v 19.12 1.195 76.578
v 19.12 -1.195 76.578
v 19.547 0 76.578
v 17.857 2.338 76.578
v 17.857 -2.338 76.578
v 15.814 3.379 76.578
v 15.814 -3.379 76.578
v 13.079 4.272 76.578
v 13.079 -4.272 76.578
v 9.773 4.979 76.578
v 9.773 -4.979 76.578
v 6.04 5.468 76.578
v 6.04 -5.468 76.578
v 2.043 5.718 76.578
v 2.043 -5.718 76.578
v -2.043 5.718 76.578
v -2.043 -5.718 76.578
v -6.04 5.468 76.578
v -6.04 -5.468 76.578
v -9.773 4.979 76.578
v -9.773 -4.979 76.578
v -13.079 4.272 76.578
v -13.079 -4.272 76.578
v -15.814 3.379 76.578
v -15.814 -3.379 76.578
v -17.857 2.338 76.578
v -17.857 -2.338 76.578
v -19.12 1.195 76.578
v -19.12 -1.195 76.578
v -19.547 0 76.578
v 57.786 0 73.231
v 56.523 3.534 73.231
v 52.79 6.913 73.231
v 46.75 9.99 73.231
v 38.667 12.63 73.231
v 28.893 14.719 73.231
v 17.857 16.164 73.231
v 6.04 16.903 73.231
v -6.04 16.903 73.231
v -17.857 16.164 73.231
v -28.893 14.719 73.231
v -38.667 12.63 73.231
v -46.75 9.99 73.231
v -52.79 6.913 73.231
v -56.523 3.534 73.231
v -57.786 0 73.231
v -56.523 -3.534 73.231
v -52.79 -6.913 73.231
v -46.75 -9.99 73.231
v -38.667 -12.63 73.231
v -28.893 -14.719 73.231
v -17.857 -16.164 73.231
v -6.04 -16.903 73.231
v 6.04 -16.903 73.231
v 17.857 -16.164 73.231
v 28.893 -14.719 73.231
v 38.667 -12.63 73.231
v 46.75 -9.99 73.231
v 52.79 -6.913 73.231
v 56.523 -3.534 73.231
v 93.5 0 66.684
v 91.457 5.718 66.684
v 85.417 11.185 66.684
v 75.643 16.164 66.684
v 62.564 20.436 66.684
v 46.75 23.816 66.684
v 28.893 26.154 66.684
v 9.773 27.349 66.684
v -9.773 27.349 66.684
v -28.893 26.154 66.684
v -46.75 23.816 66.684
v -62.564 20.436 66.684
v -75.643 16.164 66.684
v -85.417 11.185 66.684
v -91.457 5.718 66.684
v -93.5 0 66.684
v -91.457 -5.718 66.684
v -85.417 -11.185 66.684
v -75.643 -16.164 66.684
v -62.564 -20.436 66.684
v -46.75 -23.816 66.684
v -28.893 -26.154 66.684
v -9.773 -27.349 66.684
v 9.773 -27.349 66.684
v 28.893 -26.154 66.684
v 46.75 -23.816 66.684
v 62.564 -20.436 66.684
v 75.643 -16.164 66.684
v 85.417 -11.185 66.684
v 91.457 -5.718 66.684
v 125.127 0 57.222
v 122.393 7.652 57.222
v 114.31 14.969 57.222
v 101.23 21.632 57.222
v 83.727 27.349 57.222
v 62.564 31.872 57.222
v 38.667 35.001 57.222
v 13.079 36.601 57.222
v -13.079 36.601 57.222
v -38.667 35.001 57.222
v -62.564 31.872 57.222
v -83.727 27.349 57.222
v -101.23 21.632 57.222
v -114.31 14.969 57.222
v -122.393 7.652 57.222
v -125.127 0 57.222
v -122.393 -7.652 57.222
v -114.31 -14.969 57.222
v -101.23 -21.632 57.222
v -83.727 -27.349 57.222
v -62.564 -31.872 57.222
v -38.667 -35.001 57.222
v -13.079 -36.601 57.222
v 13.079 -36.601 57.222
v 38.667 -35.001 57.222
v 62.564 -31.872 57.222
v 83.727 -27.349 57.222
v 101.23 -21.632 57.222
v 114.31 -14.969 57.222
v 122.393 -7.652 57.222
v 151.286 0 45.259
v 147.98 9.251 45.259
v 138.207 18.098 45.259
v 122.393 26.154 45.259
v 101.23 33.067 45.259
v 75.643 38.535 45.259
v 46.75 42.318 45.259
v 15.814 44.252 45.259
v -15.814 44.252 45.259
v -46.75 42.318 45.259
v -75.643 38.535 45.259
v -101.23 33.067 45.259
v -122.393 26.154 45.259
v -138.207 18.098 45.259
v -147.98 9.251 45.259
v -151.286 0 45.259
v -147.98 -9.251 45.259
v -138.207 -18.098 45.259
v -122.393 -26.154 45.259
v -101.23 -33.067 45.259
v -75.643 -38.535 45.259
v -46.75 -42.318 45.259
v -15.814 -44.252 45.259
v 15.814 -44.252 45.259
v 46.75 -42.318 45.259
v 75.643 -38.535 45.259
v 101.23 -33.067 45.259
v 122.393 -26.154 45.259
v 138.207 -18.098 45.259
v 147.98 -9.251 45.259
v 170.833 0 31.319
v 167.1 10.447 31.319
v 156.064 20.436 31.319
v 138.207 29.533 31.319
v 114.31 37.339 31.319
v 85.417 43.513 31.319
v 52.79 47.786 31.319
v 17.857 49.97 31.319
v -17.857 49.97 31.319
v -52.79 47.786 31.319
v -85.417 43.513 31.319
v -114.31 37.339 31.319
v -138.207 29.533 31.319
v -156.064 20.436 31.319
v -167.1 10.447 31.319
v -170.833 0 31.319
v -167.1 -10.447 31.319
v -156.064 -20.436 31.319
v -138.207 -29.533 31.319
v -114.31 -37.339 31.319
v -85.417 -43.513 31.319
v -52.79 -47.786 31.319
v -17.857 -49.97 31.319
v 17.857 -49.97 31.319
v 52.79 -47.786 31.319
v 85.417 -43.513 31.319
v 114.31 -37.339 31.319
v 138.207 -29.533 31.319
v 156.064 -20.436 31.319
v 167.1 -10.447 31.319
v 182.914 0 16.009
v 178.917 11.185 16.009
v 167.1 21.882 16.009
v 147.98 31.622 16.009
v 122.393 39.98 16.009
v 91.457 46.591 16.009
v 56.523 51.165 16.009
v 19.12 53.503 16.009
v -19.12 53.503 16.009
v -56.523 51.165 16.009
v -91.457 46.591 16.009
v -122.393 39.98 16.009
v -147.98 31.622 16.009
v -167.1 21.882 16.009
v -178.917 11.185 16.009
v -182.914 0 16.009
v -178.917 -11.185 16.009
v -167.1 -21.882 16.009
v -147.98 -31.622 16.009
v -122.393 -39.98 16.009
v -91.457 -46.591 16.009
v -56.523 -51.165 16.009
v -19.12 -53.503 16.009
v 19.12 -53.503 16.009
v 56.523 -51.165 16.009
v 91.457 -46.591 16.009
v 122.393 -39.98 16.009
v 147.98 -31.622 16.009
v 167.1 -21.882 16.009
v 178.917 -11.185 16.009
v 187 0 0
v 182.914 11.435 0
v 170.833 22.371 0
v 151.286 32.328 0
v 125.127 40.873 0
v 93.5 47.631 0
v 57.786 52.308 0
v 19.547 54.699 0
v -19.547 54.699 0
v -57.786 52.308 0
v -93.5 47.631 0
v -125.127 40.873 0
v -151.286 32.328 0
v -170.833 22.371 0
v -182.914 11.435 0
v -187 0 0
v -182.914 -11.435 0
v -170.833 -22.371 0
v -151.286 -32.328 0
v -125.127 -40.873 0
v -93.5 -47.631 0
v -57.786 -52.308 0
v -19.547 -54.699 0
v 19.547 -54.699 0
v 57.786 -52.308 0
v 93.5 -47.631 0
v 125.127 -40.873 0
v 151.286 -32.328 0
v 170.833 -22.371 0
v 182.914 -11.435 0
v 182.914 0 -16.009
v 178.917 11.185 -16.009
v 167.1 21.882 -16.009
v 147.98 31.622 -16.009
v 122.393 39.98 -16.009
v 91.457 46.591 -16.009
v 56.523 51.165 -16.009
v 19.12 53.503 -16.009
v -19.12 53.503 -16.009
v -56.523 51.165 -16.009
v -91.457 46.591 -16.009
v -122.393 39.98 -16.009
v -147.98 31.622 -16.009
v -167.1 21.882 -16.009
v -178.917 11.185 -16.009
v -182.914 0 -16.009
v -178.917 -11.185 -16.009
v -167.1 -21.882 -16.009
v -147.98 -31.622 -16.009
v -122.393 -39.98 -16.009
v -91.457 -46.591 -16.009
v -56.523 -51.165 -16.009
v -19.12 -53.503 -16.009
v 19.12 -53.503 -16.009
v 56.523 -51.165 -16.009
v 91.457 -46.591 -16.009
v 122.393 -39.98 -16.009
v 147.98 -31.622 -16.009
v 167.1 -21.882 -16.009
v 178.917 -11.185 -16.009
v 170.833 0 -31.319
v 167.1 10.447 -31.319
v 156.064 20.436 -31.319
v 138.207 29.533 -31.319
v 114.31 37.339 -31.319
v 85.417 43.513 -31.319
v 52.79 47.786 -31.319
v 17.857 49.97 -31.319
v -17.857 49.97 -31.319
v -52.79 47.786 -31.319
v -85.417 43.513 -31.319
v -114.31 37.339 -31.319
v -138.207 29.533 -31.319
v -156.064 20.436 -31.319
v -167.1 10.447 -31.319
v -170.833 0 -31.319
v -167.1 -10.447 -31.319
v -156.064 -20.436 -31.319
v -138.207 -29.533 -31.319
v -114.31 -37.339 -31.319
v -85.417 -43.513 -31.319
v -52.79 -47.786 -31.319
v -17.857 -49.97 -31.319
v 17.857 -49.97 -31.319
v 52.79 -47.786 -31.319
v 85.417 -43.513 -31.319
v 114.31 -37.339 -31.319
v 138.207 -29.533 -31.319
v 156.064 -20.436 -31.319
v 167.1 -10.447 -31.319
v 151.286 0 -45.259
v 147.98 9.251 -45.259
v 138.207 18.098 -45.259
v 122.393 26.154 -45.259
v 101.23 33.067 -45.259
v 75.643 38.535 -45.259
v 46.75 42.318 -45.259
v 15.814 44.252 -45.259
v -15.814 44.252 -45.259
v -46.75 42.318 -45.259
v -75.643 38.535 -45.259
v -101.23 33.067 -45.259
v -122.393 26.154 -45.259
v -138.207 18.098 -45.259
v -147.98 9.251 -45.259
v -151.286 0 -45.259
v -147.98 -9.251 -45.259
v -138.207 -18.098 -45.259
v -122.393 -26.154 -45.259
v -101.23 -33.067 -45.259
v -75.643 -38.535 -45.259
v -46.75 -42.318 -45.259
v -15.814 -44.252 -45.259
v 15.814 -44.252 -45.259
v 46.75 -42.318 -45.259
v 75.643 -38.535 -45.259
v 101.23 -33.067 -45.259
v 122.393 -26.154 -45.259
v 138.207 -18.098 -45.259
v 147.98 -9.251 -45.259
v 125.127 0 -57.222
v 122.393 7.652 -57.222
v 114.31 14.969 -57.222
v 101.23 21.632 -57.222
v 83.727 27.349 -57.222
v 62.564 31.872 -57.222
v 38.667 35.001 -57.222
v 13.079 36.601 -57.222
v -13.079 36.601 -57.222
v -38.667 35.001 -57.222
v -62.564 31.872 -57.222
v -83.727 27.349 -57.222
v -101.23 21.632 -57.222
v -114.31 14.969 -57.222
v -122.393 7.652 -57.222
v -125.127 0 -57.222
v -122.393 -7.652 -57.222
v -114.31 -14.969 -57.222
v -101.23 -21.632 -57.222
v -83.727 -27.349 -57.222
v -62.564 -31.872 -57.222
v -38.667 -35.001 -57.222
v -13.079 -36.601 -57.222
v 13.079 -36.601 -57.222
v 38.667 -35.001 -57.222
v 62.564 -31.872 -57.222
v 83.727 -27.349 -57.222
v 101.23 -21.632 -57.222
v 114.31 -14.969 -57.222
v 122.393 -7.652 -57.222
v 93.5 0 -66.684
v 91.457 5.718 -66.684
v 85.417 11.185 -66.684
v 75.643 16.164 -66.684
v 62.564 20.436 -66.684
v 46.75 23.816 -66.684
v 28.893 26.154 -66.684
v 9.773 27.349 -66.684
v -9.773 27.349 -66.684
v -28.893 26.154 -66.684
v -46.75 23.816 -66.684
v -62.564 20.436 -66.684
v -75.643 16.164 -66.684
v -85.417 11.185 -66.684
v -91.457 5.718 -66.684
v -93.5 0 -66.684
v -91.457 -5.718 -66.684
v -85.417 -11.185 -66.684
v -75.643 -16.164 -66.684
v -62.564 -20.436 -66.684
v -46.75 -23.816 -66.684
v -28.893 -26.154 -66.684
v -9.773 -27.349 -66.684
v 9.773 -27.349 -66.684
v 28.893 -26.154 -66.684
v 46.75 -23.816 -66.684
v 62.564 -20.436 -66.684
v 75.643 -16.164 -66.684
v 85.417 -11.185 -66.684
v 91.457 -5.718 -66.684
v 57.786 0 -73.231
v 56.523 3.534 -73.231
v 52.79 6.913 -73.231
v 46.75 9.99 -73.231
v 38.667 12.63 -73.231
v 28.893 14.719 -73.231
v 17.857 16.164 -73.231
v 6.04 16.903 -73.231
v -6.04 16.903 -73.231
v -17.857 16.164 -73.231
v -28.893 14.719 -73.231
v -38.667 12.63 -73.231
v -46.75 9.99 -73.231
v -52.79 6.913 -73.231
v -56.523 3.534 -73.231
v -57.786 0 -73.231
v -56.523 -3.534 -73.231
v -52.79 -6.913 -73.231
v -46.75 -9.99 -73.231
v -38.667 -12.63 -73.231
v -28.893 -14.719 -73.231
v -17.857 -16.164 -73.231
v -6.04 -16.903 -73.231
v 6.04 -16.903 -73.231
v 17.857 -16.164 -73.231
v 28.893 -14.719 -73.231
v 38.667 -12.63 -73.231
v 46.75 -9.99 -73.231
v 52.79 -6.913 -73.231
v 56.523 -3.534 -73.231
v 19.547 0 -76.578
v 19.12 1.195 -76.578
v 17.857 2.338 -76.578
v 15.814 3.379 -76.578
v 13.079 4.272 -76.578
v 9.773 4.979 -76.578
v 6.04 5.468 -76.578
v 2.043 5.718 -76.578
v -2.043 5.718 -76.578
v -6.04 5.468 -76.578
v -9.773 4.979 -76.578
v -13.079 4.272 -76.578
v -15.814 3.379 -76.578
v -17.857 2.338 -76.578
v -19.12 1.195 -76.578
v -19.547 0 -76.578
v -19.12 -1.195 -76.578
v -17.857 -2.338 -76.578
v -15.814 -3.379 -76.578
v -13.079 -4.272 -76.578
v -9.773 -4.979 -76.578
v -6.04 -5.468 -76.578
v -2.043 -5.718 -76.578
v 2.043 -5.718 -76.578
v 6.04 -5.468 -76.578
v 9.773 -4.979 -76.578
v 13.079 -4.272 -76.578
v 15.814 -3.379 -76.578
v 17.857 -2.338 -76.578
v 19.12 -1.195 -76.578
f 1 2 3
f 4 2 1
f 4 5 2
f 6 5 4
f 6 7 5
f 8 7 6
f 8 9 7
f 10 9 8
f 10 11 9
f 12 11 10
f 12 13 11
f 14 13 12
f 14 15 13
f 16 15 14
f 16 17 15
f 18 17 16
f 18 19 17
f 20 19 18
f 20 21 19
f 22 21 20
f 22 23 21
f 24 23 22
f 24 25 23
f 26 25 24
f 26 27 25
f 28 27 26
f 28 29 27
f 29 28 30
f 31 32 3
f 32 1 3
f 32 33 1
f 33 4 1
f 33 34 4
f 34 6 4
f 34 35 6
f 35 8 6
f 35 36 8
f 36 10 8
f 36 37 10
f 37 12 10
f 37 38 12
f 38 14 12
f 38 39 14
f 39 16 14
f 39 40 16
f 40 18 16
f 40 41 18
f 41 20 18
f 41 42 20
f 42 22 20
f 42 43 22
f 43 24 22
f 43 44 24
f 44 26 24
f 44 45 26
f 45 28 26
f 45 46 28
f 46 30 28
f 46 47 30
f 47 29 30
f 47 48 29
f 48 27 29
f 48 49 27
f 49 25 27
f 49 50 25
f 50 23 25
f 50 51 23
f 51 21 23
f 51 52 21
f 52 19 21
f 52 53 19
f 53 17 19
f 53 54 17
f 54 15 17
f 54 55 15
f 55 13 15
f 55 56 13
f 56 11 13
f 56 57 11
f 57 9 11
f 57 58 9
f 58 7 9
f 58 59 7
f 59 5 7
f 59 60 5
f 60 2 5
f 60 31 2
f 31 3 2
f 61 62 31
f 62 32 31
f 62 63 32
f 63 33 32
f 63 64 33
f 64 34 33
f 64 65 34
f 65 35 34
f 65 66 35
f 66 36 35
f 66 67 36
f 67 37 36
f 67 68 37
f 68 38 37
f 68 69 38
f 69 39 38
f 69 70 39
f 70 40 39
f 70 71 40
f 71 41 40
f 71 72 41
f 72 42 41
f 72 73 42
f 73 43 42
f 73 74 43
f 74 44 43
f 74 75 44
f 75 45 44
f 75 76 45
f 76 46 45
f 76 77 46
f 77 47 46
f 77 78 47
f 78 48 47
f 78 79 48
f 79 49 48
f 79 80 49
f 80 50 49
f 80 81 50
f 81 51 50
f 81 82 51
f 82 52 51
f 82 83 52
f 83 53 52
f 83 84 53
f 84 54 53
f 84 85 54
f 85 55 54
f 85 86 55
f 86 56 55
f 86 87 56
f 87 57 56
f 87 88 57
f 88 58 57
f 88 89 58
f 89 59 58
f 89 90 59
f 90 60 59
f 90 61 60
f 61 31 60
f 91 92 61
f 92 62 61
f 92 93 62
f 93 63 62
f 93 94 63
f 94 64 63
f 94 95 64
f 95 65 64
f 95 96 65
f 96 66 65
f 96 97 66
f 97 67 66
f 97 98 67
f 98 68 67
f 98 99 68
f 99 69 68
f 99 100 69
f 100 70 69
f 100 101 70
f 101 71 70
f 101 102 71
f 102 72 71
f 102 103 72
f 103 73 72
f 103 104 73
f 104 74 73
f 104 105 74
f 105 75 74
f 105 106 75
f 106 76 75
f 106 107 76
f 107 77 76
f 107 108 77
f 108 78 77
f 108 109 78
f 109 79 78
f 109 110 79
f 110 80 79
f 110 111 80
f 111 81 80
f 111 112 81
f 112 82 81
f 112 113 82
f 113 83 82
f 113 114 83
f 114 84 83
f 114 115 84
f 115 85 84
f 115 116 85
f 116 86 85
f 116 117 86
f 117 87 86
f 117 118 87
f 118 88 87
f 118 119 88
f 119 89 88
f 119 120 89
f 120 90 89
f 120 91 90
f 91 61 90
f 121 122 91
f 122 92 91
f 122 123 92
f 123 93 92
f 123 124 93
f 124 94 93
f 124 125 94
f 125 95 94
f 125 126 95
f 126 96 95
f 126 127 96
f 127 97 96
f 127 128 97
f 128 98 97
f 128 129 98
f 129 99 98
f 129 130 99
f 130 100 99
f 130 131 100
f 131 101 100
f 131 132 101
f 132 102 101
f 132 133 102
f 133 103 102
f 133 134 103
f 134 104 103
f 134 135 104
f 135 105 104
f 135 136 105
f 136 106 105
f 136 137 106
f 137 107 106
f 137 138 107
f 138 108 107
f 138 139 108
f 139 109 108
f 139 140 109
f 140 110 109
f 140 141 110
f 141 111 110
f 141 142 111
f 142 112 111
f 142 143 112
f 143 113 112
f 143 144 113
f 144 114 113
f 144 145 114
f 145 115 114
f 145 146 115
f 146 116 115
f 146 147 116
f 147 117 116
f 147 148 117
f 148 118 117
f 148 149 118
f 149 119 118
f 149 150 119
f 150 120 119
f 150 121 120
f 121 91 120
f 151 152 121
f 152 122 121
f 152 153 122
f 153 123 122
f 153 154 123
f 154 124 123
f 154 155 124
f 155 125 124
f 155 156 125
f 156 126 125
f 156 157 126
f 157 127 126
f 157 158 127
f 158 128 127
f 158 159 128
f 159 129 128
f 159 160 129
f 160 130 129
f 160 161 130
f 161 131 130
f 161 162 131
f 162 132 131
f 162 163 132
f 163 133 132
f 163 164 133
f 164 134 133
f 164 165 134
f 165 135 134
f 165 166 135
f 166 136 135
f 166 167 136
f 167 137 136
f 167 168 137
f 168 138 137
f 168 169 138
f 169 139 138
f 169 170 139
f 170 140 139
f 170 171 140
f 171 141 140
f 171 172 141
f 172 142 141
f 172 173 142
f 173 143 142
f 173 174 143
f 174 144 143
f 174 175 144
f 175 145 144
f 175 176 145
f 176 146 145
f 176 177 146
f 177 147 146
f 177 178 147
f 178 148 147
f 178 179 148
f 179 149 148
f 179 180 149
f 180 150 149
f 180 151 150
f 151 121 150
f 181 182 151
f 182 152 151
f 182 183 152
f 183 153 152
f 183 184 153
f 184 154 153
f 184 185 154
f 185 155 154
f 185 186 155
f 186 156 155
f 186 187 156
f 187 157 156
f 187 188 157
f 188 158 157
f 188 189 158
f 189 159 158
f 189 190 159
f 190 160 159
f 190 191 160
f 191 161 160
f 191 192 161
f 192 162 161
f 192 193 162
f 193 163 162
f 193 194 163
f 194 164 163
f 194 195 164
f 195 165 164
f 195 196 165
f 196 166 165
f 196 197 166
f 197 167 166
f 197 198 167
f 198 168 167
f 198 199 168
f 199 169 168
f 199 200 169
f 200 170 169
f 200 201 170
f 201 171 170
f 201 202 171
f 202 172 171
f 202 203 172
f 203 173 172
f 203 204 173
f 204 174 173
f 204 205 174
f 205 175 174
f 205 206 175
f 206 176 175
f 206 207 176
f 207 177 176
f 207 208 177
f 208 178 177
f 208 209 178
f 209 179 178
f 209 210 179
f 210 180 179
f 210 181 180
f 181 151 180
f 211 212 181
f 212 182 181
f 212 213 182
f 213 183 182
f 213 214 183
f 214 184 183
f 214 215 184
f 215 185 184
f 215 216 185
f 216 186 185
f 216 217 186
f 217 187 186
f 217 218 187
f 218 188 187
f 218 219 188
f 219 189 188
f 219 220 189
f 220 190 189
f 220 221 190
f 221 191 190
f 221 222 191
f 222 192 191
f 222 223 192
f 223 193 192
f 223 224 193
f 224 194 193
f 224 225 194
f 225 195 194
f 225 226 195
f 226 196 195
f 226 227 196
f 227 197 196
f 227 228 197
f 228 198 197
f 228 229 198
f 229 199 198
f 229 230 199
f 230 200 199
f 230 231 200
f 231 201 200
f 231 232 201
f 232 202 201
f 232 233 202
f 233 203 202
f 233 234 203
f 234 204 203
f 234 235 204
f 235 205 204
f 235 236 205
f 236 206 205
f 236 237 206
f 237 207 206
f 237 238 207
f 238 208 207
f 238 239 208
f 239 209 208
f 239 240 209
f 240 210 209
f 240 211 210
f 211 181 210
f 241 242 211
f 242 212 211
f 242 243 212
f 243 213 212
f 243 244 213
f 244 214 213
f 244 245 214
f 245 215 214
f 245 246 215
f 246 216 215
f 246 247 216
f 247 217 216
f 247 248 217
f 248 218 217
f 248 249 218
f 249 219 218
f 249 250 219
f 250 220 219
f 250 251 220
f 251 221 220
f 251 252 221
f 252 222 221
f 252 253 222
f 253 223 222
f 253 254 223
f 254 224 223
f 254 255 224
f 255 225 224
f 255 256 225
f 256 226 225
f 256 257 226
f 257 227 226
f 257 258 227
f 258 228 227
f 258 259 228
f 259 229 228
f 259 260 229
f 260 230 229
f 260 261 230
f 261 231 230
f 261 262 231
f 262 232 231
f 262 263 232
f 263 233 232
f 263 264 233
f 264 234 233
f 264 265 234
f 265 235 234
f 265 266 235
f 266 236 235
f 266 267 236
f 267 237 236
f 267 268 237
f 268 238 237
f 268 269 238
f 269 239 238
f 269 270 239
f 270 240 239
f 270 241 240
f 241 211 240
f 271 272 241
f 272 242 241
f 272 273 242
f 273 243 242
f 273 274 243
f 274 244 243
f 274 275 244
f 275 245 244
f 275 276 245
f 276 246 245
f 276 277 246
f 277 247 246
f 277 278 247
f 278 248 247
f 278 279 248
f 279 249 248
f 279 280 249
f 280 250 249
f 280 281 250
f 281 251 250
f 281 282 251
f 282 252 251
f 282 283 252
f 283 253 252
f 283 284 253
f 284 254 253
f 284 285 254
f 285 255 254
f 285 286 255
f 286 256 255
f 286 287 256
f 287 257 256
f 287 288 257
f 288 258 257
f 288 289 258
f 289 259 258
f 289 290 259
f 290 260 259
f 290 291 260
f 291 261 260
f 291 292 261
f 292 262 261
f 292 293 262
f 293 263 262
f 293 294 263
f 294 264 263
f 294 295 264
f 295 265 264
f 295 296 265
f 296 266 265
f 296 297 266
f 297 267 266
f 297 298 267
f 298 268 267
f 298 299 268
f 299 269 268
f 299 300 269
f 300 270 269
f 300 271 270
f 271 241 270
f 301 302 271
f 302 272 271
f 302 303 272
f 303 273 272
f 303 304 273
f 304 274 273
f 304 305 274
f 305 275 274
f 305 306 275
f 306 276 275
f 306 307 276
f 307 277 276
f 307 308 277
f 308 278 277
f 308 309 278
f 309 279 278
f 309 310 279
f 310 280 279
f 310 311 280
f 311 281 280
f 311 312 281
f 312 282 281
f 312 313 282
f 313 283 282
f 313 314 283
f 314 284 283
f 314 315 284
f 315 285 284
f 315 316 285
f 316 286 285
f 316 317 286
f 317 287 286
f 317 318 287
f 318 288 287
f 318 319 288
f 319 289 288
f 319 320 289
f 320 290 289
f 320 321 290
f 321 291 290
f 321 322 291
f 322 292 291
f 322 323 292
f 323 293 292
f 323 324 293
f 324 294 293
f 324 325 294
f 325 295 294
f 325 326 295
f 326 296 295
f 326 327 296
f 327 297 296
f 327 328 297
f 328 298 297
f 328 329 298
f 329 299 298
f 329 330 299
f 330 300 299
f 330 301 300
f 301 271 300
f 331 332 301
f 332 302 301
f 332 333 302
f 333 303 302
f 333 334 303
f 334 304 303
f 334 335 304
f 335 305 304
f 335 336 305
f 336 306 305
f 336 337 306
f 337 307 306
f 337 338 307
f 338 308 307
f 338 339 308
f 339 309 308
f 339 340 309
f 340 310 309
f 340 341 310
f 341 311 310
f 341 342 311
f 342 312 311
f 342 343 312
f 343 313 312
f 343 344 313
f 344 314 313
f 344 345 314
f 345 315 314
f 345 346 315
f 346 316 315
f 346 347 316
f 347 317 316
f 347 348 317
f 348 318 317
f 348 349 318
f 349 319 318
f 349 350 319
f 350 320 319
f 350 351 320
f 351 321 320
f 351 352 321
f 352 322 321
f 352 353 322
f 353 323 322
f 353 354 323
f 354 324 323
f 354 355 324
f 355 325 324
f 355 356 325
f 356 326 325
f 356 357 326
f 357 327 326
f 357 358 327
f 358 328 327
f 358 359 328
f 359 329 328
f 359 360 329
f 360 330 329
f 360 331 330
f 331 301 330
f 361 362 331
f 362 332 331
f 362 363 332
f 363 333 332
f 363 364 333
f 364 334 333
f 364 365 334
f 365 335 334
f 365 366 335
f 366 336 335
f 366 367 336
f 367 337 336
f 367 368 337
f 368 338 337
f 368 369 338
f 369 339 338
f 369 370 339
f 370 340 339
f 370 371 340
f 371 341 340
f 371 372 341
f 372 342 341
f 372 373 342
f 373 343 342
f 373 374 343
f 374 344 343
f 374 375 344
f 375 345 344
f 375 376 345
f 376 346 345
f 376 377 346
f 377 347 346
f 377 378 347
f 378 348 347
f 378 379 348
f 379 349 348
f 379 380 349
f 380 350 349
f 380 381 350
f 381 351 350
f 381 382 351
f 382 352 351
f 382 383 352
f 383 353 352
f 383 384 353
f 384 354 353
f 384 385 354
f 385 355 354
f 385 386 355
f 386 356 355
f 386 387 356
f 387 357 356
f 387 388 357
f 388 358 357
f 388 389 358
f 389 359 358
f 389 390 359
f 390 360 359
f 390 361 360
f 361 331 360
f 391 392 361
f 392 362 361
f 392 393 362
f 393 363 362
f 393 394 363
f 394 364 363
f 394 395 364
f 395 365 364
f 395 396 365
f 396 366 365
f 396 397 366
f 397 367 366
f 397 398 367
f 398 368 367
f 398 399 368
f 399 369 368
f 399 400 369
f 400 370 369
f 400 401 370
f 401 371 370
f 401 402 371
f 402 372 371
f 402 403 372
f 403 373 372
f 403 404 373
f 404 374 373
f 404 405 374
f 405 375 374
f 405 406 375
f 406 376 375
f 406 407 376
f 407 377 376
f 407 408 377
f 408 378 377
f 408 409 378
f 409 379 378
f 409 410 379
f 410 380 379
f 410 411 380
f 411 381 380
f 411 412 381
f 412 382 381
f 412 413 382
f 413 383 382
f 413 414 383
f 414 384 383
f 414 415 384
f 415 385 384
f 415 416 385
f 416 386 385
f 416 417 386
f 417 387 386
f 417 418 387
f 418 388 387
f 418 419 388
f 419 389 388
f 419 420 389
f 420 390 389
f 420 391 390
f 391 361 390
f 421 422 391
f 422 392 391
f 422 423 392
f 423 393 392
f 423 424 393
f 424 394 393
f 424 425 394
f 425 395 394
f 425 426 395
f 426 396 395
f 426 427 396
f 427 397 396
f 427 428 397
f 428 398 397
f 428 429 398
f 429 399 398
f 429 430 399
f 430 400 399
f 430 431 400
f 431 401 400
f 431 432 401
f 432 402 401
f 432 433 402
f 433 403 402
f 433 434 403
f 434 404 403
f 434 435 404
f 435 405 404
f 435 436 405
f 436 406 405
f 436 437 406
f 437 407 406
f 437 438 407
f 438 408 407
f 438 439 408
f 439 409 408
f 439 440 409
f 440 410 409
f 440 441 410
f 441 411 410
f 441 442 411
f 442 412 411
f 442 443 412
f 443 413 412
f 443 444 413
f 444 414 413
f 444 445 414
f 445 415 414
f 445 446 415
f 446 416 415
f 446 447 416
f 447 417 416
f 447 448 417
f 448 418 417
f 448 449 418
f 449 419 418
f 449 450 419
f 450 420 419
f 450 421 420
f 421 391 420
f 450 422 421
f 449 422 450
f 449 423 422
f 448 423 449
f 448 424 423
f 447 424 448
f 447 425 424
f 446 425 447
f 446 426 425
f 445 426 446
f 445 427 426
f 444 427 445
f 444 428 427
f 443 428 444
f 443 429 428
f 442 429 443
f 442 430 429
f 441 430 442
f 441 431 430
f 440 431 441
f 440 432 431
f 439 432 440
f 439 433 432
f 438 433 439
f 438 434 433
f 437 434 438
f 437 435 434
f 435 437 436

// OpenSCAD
// Generated by SolidPython 1.0.1 on 2020-07-29 00:46:52


scale(v = [17, 5, 7]) {
	sphere(r = 11);
}
/***********************************************
*********      SolidPython code:      **********
************************************************
 
# import packages: SolidPython
from solid import *
from solid.utils import *
from itertools import chain, combinations, permutations


class Resize:

    def __init__(self, scad_file):
        self.scad_file = scad_file
        #self.scad_file = import_scad(scad_file)
        # cone/cylinder param:
        self.r1 = 0
        self.r2 = 0
        self.h = 0
        # rectangular prism param:
        self.w = 0
        self.l = 0
        # ellipse param:
        self.r = 0

    # import OpenScad code (file name corresponds to shape)


    # classify shape + parameters
    def assign(self, param1, param2, param3):
        if self.scad_file == 'cone.scad':
            self.r1 = param1
            self.r2 = param2
            self.h = param3
        elif self.scad_file == 'cylinder.scad':
            self.r1 = param1
            self.r2 = param2
            self.h = param3
        elif self.scad_file == 'rectangularPrism.scad':
            self.h = param1
            self.l = param2
            self.w = param3
        else:
            self.r = param1
            self.h = param2

    # resize parameters
    def iterate(self):
        x = range(3, 20, 2)
        i = 1
        if self.scad_file == 'cone.scad':
            tempList = list(permutations(x, 2))
            for temp in tempList:
                param1 = temp[0]
                param2 = temp[1]
                filepath = 'produced_scad_files/' + 'cone' + str(param1) + '_' + str(param2) + '_' + '.scad'
                scad_render_to_file(cylinder(h=param1, r1=param2, r2=0), filepath)

        elif self.scad_file == 'cylinder.scad':
            tempList = list(permutations(x, 3))
            for temp in tempList:
                param1 = temp[0]
                param2 = temp[1]
                filepath = 'produced_scad_files/' + 'cylinder' + str(param1) + '_' + str(param2) + '_' + '.scad'
                scad_render_to_file(cylinder(h=param1, r1=param2, r2=param2), filepath)

        elif self.scad_file == 'rectangularPrism.scad':
            tempList = list(permutations(x, 3))
            for temp in tempList:
                param1 = temp[0]
                param2 = temp[1]
                param3 = temp[2]
                filepath = 'produced_scad_files/' + 'rectangularPrism' + str(param1) + '_' + str(param2) + '_' + str(
                    param3) + '.scad'
                scad_render_to_file(cube(size=(param1, param2, param3)), filepath)

        elif self.scad_file == 'ellipse.scad':
            tempList = list(permutations(x, 4))
            for temp in tempList:
                param1 = temp[0]
                param2 = temp[1]
                param3 = temp[2]
                param4 = temp[3]
                filepath = 'produced_scad_files/' + 'ellipse' + str(param1) + '_' + str(param2) + '_' + str(param3) + '_' + str(param4) + '.scad'
                scad_render_to_file(scale([param1, param2, param3])(sphere(r=param4)), filepath)

    def render_to_scadfile(self):
        scad_render_to_file(scad, 'example.scad') 
 
************************************************/
